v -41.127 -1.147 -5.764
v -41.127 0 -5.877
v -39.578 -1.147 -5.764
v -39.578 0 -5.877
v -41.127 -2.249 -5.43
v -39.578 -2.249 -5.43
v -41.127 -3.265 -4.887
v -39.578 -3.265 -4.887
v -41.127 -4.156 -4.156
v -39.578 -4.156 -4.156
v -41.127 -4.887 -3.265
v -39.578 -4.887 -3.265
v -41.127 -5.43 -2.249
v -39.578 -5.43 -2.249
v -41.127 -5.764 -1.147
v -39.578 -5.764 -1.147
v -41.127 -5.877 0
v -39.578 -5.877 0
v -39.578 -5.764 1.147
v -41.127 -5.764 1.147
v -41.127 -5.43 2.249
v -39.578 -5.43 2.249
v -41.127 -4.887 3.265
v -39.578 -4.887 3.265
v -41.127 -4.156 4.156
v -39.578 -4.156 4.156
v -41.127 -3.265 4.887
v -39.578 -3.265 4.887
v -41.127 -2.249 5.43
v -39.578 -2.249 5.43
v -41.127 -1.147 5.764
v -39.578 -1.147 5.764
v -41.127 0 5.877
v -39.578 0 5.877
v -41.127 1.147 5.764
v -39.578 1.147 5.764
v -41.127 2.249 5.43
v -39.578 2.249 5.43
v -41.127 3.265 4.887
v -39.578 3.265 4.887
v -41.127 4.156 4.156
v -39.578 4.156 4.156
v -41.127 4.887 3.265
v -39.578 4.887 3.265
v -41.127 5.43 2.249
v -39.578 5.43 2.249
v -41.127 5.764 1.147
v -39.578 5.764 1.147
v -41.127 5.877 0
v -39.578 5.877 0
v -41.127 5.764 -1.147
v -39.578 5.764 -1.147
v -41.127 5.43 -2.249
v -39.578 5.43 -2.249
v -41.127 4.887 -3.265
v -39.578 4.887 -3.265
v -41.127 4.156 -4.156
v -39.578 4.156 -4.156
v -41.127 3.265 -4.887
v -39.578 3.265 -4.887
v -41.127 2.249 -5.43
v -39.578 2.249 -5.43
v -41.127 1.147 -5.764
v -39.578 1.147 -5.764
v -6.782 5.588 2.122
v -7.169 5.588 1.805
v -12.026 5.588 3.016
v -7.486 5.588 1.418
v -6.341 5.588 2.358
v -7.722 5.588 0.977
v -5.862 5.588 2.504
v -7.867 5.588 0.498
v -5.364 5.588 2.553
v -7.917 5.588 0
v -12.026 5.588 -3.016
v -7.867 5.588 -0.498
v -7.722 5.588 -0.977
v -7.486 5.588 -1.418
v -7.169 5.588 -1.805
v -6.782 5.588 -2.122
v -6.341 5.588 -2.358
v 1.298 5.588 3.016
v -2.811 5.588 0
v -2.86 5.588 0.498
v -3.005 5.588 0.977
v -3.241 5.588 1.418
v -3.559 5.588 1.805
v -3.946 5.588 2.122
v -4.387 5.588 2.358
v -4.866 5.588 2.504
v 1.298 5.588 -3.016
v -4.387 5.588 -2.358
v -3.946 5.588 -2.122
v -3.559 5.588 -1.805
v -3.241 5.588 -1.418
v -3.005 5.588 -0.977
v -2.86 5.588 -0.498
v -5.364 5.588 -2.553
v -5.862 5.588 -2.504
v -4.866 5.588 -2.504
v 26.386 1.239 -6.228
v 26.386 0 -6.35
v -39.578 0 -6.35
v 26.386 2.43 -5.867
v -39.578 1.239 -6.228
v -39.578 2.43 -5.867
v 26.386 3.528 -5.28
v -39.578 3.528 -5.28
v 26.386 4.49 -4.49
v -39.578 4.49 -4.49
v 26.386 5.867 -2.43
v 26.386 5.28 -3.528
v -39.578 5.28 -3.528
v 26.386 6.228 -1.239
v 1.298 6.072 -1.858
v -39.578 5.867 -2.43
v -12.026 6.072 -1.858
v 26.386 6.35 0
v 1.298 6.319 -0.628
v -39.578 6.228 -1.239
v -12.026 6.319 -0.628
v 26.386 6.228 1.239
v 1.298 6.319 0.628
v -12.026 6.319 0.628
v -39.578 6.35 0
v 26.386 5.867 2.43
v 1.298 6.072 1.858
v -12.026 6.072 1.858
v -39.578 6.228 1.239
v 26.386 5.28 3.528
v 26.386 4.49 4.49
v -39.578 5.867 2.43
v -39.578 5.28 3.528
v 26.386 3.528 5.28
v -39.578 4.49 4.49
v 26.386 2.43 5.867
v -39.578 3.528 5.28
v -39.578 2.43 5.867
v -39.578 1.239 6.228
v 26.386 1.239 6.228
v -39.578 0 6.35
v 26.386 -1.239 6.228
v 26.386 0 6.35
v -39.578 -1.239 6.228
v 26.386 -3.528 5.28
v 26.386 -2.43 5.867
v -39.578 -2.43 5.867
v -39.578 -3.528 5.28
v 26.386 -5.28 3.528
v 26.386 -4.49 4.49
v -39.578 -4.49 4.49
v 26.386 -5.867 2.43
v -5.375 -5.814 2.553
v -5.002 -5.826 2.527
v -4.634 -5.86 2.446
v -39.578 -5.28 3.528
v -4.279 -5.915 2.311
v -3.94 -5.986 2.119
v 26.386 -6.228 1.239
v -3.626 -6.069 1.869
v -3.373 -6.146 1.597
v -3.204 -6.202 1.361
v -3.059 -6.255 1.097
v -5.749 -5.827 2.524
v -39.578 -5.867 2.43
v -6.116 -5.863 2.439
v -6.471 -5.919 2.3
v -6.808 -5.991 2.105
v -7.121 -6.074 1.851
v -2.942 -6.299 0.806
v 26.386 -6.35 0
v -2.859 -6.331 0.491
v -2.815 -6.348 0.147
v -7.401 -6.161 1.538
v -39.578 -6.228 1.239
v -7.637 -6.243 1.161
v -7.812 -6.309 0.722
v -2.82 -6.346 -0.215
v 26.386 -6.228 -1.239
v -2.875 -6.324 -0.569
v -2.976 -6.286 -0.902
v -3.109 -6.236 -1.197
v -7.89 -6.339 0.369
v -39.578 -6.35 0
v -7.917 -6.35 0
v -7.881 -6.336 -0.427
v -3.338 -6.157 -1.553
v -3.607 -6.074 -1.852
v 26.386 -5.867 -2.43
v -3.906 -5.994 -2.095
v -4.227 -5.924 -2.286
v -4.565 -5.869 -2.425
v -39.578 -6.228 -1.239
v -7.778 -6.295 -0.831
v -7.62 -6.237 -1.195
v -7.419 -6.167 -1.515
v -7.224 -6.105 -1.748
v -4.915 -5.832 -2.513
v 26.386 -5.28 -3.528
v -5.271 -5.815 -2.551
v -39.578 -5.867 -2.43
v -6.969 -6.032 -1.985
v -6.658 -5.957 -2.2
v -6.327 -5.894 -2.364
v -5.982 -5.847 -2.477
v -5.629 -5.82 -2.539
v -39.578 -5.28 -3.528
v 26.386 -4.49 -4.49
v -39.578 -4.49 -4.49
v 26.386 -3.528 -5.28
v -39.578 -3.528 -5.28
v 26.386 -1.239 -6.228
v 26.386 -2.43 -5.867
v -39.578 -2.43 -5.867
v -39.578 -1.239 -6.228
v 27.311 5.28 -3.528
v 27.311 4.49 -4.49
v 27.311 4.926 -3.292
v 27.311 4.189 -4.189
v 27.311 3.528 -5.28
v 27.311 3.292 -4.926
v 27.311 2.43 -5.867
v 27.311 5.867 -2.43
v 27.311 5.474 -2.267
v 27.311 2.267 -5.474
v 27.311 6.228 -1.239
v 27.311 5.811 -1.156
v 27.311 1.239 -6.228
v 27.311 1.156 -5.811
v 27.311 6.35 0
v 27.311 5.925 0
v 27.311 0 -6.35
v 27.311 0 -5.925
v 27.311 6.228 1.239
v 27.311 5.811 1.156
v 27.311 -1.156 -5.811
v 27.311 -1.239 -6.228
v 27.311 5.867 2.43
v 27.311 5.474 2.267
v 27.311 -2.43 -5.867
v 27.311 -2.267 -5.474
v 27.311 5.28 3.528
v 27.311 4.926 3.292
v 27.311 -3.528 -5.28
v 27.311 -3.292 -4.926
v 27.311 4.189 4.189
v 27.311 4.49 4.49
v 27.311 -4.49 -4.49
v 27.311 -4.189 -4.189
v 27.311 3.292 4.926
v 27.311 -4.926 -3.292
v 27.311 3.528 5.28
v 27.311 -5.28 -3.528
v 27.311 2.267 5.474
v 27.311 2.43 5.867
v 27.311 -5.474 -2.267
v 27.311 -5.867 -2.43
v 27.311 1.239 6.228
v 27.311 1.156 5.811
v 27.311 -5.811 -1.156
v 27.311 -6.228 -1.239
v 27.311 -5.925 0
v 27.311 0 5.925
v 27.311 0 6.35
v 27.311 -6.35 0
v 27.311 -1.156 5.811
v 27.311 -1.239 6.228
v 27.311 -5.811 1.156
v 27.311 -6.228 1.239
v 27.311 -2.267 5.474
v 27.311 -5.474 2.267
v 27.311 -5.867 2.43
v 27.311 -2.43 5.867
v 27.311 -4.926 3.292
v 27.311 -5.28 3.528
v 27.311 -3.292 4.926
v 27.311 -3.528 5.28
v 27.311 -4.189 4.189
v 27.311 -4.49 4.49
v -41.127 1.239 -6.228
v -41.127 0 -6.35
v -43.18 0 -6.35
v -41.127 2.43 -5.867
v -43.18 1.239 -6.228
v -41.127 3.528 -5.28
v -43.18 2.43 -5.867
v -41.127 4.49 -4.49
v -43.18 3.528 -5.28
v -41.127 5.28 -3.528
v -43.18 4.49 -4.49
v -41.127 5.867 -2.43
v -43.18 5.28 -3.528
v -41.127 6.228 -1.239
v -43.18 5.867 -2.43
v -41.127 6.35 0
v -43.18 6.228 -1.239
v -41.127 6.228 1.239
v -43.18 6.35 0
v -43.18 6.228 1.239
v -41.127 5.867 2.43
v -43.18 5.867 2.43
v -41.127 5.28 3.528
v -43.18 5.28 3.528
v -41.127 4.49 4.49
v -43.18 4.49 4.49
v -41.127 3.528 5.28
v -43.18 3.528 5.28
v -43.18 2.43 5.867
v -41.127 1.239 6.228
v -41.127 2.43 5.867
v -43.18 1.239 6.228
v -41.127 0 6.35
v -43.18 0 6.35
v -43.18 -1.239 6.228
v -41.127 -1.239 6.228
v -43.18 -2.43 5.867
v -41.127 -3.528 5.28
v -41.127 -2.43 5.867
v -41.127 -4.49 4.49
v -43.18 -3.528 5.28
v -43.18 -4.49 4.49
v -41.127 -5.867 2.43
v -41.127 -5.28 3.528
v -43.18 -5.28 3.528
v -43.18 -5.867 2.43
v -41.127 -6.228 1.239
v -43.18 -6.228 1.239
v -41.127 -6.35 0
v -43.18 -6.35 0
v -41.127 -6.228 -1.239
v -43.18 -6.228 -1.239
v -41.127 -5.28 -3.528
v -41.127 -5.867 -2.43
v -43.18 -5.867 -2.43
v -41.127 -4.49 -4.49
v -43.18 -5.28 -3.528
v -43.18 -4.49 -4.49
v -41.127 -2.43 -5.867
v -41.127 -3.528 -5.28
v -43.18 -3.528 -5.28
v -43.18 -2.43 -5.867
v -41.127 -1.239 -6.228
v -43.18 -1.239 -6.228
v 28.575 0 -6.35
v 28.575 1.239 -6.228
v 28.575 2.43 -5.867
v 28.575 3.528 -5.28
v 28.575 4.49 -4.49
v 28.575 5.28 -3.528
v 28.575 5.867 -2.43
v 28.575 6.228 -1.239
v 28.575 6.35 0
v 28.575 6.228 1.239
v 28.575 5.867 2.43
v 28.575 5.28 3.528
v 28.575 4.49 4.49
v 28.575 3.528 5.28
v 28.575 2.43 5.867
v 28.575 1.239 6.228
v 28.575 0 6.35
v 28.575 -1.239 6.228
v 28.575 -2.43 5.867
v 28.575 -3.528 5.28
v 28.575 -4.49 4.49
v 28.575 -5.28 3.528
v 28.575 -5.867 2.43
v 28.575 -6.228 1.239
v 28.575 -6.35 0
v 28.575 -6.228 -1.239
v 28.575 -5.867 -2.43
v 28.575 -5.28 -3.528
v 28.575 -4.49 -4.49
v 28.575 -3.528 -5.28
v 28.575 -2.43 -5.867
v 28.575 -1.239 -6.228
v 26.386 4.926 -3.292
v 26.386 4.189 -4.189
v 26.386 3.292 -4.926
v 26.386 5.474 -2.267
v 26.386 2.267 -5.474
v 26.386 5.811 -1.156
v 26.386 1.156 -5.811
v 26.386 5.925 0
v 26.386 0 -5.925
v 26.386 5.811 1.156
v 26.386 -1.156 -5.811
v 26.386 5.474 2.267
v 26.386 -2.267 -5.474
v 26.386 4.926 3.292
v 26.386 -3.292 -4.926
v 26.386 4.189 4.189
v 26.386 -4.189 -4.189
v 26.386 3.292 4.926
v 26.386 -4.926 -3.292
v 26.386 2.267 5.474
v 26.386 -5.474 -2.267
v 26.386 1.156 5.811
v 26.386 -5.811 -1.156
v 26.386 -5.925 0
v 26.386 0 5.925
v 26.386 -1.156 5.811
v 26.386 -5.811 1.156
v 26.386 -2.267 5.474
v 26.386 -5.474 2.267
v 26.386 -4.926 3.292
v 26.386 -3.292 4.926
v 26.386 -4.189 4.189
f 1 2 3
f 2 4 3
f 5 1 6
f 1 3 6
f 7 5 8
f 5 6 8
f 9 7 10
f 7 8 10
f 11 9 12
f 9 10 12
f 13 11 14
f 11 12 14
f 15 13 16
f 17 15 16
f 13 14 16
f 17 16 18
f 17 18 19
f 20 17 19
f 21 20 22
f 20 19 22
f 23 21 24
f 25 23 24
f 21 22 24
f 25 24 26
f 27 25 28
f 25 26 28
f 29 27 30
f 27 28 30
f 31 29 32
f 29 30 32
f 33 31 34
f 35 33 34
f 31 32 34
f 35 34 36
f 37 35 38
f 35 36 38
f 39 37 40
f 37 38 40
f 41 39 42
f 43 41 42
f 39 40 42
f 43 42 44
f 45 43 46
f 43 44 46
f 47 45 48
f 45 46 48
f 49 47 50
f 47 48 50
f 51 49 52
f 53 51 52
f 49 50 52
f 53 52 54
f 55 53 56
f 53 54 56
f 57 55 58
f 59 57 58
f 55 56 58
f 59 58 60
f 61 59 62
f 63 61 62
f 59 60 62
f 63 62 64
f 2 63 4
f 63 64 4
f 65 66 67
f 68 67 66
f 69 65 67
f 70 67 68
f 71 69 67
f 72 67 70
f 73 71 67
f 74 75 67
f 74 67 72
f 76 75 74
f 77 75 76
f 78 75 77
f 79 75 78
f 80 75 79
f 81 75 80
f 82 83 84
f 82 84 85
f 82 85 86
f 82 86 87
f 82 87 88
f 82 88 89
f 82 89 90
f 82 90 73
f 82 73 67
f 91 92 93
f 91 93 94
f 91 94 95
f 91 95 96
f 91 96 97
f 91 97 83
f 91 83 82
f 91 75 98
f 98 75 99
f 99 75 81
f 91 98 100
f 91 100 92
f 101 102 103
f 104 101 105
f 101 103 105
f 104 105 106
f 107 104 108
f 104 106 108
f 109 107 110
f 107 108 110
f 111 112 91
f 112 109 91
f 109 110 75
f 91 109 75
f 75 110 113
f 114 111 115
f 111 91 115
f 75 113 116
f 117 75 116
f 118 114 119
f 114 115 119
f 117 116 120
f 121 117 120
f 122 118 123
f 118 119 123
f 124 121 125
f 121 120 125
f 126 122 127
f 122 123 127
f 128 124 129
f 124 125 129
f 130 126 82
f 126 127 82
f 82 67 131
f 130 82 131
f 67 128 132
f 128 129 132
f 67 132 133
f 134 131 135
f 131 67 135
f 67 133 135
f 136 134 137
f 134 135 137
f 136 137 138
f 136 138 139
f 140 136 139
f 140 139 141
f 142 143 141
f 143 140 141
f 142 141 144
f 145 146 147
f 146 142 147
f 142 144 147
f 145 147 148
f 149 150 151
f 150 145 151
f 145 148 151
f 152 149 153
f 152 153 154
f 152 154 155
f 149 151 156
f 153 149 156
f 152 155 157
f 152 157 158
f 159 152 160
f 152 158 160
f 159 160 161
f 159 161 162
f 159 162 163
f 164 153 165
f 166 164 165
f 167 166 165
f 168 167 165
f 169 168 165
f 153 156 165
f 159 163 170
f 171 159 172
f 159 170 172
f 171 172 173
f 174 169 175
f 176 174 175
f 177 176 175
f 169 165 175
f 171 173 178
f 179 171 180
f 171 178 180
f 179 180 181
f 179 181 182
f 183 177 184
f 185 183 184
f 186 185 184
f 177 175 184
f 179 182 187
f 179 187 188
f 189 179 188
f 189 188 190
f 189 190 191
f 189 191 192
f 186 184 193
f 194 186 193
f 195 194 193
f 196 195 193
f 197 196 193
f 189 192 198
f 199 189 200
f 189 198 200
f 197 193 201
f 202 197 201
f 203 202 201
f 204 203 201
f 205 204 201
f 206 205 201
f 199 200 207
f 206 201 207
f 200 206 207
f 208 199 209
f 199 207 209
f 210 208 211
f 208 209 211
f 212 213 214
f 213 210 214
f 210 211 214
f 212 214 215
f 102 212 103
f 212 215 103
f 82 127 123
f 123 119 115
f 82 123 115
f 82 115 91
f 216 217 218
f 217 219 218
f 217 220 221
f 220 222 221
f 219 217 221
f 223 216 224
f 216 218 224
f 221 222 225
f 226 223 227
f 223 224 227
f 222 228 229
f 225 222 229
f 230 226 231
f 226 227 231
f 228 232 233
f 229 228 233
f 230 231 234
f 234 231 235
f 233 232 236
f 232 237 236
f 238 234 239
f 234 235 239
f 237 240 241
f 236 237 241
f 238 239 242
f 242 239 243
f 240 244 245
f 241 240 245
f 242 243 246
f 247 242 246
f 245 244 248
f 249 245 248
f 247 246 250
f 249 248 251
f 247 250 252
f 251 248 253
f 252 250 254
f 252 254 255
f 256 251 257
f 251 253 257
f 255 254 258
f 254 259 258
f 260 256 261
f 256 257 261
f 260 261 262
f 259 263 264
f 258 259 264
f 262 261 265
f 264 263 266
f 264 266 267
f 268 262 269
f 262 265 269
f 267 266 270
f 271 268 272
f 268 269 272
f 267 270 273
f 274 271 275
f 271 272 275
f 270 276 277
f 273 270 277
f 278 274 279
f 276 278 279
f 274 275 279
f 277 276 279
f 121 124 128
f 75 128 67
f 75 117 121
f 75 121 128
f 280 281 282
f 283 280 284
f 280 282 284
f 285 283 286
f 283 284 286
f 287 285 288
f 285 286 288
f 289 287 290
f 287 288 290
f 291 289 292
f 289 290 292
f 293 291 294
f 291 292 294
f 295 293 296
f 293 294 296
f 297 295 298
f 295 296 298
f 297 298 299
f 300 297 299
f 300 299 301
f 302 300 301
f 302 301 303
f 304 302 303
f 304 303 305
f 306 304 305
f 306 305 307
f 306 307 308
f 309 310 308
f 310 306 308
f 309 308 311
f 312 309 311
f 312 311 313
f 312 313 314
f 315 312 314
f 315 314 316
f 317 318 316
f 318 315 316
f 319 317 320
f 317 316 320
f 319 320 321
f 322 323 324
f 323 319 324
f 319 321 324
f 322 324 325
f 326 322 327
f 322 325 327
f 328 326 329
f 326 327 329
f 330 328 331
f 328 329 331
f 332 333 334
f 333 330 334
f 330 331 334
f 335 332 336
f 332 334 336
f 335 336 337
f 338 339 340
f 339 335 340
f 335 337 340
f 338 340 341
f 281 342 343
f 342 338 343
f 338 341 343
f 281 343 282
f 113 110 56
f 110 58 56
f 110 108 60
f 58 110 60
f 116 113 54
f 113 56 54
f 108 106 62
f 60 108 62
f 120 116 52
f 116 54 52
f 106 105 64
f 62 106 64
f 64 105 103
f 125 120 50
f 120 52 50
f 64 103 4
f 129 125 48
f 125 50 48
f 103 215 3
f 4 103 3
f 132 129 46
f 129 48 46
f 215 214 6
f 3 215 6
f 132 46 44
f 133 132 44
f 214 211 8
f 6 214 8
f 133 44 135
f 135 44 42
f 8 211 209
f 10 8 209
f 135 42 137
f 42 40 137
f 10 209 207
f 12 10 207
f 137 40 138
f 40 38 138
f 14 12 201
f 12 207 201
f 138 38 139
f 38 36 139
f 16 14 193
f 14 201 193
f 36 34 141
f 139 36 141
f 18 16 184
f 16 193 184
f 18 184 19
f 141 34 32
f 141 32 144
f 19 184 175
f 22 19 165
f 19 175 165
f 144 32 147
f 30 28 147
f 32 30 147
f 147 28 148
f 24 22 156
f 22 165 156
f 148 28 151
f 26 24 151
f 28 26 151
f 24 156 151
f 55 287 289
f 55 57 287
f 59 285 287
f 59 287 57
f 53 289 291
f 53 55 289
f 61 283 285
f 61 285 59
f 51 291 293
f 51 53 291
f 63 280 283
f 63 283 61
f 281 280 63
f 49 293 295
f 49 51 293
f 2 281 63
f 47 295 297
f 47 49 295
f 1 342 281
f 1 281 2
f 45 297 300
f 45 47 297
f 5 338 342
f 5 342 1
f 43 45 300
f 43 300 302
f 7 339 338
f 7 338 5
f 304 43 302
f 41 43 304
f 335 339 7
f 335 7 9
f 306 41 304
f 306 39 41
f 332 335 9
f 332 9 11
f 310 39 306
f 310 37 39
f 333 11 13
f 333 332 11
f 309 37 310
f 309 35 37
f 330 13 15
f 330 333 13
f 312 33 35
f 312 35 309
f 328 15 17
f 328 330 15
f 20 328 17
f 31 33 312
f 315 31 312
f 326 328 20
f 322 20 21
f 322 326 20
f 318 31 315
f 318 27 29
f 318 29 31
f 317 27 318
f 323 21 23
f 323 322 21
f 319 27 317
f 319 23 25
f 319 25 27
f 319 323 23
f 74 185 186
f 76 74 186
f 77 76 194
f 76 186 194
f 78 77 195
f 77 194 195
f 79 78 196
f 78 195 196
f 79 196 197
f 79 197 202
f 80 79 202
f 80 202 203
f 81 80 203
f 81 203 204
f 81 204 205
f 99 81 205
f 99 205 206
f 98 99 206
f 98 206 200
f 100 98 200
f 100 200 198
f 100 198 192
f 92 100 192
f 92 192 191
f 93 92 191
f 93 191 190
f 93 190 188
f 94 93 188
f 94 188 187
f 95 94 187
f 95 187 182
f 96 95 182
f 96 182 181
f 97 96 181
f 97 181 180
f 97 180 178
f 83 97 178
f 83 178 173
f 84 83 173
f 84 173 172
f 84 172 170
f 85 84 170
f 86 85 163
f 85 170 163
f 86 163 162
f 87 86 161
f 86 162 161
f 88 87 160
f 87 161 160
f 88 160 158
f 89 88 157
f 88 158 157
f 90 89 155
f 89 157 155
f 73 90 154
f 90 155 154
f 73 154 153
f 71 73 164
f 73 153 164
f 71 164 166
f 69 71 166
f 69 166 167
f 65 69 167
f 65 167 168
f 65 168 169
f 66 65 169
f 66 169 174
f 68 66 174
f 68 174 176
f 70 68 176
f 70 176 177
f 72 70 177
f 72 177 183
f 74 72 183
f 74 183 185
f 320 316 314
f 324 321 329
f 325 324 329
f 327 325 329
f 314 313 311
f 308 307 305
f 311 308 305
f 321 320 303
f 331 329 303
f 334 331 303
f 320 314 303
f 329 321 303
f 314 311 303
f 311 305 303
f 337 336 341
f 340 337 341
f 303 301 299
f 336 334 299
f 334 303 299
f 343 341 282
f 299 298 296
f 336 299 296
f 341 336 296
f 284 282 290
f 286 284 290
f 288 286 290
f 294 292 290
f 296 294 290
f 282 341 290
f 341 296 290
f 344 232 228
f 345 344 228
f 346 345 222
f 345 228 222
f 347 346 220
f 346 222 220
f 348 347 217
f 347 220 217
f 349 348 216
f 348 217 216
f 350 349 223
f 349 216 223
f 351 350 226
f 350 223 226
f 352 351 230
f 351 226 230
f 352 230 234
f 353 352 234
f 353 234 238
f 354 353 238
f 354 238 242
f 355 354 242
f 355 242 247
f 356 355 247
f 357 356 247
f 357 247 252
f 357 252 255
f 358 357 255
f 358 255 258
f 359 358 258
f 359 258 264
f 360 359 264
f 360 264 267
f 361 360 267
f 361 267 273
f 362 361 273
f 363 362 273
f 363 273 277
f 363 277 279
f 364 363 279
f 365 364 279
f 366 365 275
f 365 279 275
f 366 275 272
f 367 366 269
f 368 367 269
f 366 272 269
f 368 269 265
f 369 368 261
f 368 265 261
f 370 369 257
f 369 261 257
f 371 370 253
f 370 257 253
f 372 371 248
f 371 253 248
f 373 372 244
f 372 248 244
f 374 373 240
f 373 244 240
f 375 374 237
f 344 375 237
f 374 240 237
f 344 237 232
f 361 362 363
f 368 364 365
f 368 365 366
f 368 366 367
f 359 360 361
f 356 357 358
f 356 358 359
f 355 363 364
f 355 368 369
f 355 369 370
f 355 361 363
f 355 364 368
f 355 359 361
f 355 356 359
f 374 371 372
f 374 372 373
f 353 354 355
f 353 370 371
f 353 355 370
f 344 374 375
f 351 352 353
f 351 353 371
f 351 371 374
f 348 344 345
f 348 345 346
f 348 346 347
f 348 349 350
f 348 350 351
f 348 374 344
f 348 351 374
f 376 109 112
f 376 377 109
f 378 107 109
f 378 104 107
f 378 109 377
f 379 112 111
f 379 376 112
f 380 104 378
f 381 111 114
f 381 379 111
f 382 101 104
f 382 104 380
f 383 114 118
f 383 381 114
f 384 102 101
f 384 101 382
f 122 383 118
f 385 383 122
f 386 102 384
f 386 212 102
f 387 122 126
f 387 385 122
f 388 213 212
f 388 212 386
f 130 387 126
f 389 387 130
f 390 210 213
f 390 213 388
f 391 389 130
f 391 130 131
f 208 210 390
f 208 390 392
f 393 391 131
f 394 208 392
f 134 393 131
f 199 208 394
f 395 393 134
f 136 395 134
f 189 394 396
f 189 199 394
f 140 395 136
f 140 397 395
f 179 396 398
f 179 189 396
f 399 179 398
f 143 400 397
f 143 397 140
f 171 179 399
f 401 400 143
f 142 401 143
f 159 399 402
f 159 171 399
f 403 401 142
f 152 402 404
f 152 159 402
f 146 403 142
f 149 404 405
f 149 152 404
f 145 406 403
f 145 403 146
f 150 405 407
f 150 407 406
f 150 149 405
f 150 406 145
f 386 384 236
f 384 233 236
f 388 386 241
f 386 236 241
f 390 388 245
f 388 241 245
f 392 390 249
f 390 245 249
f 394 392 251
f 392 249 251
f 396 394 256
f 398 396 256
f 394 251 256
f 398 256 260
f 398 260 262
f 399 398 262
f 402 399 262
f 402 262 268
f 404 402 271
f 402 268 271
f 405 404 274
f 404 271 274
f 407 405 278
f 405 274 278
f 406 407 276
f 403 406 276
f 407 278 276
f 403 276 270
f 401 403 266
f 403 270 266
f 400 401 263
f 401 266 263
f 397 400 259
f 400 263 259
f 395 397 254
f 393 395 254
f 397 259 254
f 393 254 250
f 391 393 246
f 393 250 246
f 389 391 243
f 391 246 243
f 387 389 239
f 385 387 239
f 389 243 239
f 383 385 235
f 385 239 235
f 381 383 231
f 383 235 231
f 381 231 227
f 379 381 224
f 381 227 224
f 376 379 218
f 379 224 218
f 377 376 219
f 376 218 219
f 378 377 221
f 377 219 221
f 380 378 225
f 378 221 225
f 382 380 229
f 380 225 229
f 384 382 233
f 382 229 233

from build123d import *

# Parameters (mm, degrees)
SKETCH1_R               = 6.35
BOSS_EXTRUDE1_DEPTH     = 28.575
SKETCH2_W               = 0.924673016
SKETCH2_H               = 0.42538178
BOSS_EXTRUDE3_START     = -43.18
SKETCH7_R               = 6.35
BOSS_EXTRUDE3_DEPTH     = 43.18
SKETCH8_W               = 1.548924628
SKETCH8_H               = 0.472995579
F_1_4_20_TAPPED_HOLE2_D = 5.1054
SKETCH17_W              = 13.324603024
SKETCH17_H              = 8.990077112
CUT_EXTRUDE3_DEPTH      = 0.762


with BuildPart() as part:
    # Sketch1 → Boss-Extrude1 (new body)
    with BuildSketch(Plane(origin=(0, 0, 0), x_dir=(0, 0, -1), z_dir=(1, 0, 0))):
        Circle(SKETCH1_R)
    extrude(amount=BOSS_EXTRUDE1_DEPTH)

    # Sketch2 → Cut-Revolve1 (revolve, cut)
    with BuildSketch(Plane.XY, mode=Mode.PRIVATE) as cut_revolve1_sk:
        with Locations((26.848530558, 6.13730911)):
            Rectangle(SKETCH2_W, SKETCH2_H)
    revolve(cut_revolve1_sk.sketch.rotate(Axis((28.575, 0, 0), (-1, 0, 0)), 90), axis=Axis((28.575, 0, 0), (-1, 0, 0)), mode=Mode.SUBTRACT)

    # Sketch7 → Boss-Extrude3 (add)
    with BuildSketch(Plane(origin=(0, 0, 0), x_dir=(0, 0, -1), z_dir=(1, 0, 0)).offset(BOSS_EXTRUDE3_START)):
        Circle(SKETCH7_R)
    extrude(amount=BOSS_EXTRUDE3_DEPTH)

    # Sketch8 → Cut-Revolve2 (revolve, cut)
    with BuildSketch(Plane.XY, mode=Mode.PRIVATE) as cut_revolve2_sk:
        with Locations((-40.352206887, 6.113502211)):
            Rectangle(SKETCH8_W, SKETCH8_H)
    revolve(cut_revolve2_sk.sketch.rotate(Axis((28.575, 0, 0), (-1, 0, 0)), 90), axis=Axis((28.575, 0, 0), (-1, 0, 0)), mode=Mode.SUBTRACT)

    # 1/4-20 Tapped Hole2 (through all)
    with Locations(Plane(origin=(0, 6.35, 0), x_dir=(1, 0, 0), z_dir=(0, 1, 0))):
        with Locations((-5.36380595, 0)):
            Hole(F_1_4_20_TAPPED_HOLE2_D / 2)

    # Sketch17 → Cut-Extrude3 (cut)
    with BuildSketch(Plane(origin=(0, 6.35, 0), x_dir=(1, 0, 0), z_dir=(0, 1, 0))):
        with Locations((-5.36380595, 0)):
            Rectangle(SKETCH17_W, SKETCH17_H)
    extrude(amount=-CUT_EXTRUDE3_DEPTH, mode=Mode.SUBTRACT)


solid = part.part
